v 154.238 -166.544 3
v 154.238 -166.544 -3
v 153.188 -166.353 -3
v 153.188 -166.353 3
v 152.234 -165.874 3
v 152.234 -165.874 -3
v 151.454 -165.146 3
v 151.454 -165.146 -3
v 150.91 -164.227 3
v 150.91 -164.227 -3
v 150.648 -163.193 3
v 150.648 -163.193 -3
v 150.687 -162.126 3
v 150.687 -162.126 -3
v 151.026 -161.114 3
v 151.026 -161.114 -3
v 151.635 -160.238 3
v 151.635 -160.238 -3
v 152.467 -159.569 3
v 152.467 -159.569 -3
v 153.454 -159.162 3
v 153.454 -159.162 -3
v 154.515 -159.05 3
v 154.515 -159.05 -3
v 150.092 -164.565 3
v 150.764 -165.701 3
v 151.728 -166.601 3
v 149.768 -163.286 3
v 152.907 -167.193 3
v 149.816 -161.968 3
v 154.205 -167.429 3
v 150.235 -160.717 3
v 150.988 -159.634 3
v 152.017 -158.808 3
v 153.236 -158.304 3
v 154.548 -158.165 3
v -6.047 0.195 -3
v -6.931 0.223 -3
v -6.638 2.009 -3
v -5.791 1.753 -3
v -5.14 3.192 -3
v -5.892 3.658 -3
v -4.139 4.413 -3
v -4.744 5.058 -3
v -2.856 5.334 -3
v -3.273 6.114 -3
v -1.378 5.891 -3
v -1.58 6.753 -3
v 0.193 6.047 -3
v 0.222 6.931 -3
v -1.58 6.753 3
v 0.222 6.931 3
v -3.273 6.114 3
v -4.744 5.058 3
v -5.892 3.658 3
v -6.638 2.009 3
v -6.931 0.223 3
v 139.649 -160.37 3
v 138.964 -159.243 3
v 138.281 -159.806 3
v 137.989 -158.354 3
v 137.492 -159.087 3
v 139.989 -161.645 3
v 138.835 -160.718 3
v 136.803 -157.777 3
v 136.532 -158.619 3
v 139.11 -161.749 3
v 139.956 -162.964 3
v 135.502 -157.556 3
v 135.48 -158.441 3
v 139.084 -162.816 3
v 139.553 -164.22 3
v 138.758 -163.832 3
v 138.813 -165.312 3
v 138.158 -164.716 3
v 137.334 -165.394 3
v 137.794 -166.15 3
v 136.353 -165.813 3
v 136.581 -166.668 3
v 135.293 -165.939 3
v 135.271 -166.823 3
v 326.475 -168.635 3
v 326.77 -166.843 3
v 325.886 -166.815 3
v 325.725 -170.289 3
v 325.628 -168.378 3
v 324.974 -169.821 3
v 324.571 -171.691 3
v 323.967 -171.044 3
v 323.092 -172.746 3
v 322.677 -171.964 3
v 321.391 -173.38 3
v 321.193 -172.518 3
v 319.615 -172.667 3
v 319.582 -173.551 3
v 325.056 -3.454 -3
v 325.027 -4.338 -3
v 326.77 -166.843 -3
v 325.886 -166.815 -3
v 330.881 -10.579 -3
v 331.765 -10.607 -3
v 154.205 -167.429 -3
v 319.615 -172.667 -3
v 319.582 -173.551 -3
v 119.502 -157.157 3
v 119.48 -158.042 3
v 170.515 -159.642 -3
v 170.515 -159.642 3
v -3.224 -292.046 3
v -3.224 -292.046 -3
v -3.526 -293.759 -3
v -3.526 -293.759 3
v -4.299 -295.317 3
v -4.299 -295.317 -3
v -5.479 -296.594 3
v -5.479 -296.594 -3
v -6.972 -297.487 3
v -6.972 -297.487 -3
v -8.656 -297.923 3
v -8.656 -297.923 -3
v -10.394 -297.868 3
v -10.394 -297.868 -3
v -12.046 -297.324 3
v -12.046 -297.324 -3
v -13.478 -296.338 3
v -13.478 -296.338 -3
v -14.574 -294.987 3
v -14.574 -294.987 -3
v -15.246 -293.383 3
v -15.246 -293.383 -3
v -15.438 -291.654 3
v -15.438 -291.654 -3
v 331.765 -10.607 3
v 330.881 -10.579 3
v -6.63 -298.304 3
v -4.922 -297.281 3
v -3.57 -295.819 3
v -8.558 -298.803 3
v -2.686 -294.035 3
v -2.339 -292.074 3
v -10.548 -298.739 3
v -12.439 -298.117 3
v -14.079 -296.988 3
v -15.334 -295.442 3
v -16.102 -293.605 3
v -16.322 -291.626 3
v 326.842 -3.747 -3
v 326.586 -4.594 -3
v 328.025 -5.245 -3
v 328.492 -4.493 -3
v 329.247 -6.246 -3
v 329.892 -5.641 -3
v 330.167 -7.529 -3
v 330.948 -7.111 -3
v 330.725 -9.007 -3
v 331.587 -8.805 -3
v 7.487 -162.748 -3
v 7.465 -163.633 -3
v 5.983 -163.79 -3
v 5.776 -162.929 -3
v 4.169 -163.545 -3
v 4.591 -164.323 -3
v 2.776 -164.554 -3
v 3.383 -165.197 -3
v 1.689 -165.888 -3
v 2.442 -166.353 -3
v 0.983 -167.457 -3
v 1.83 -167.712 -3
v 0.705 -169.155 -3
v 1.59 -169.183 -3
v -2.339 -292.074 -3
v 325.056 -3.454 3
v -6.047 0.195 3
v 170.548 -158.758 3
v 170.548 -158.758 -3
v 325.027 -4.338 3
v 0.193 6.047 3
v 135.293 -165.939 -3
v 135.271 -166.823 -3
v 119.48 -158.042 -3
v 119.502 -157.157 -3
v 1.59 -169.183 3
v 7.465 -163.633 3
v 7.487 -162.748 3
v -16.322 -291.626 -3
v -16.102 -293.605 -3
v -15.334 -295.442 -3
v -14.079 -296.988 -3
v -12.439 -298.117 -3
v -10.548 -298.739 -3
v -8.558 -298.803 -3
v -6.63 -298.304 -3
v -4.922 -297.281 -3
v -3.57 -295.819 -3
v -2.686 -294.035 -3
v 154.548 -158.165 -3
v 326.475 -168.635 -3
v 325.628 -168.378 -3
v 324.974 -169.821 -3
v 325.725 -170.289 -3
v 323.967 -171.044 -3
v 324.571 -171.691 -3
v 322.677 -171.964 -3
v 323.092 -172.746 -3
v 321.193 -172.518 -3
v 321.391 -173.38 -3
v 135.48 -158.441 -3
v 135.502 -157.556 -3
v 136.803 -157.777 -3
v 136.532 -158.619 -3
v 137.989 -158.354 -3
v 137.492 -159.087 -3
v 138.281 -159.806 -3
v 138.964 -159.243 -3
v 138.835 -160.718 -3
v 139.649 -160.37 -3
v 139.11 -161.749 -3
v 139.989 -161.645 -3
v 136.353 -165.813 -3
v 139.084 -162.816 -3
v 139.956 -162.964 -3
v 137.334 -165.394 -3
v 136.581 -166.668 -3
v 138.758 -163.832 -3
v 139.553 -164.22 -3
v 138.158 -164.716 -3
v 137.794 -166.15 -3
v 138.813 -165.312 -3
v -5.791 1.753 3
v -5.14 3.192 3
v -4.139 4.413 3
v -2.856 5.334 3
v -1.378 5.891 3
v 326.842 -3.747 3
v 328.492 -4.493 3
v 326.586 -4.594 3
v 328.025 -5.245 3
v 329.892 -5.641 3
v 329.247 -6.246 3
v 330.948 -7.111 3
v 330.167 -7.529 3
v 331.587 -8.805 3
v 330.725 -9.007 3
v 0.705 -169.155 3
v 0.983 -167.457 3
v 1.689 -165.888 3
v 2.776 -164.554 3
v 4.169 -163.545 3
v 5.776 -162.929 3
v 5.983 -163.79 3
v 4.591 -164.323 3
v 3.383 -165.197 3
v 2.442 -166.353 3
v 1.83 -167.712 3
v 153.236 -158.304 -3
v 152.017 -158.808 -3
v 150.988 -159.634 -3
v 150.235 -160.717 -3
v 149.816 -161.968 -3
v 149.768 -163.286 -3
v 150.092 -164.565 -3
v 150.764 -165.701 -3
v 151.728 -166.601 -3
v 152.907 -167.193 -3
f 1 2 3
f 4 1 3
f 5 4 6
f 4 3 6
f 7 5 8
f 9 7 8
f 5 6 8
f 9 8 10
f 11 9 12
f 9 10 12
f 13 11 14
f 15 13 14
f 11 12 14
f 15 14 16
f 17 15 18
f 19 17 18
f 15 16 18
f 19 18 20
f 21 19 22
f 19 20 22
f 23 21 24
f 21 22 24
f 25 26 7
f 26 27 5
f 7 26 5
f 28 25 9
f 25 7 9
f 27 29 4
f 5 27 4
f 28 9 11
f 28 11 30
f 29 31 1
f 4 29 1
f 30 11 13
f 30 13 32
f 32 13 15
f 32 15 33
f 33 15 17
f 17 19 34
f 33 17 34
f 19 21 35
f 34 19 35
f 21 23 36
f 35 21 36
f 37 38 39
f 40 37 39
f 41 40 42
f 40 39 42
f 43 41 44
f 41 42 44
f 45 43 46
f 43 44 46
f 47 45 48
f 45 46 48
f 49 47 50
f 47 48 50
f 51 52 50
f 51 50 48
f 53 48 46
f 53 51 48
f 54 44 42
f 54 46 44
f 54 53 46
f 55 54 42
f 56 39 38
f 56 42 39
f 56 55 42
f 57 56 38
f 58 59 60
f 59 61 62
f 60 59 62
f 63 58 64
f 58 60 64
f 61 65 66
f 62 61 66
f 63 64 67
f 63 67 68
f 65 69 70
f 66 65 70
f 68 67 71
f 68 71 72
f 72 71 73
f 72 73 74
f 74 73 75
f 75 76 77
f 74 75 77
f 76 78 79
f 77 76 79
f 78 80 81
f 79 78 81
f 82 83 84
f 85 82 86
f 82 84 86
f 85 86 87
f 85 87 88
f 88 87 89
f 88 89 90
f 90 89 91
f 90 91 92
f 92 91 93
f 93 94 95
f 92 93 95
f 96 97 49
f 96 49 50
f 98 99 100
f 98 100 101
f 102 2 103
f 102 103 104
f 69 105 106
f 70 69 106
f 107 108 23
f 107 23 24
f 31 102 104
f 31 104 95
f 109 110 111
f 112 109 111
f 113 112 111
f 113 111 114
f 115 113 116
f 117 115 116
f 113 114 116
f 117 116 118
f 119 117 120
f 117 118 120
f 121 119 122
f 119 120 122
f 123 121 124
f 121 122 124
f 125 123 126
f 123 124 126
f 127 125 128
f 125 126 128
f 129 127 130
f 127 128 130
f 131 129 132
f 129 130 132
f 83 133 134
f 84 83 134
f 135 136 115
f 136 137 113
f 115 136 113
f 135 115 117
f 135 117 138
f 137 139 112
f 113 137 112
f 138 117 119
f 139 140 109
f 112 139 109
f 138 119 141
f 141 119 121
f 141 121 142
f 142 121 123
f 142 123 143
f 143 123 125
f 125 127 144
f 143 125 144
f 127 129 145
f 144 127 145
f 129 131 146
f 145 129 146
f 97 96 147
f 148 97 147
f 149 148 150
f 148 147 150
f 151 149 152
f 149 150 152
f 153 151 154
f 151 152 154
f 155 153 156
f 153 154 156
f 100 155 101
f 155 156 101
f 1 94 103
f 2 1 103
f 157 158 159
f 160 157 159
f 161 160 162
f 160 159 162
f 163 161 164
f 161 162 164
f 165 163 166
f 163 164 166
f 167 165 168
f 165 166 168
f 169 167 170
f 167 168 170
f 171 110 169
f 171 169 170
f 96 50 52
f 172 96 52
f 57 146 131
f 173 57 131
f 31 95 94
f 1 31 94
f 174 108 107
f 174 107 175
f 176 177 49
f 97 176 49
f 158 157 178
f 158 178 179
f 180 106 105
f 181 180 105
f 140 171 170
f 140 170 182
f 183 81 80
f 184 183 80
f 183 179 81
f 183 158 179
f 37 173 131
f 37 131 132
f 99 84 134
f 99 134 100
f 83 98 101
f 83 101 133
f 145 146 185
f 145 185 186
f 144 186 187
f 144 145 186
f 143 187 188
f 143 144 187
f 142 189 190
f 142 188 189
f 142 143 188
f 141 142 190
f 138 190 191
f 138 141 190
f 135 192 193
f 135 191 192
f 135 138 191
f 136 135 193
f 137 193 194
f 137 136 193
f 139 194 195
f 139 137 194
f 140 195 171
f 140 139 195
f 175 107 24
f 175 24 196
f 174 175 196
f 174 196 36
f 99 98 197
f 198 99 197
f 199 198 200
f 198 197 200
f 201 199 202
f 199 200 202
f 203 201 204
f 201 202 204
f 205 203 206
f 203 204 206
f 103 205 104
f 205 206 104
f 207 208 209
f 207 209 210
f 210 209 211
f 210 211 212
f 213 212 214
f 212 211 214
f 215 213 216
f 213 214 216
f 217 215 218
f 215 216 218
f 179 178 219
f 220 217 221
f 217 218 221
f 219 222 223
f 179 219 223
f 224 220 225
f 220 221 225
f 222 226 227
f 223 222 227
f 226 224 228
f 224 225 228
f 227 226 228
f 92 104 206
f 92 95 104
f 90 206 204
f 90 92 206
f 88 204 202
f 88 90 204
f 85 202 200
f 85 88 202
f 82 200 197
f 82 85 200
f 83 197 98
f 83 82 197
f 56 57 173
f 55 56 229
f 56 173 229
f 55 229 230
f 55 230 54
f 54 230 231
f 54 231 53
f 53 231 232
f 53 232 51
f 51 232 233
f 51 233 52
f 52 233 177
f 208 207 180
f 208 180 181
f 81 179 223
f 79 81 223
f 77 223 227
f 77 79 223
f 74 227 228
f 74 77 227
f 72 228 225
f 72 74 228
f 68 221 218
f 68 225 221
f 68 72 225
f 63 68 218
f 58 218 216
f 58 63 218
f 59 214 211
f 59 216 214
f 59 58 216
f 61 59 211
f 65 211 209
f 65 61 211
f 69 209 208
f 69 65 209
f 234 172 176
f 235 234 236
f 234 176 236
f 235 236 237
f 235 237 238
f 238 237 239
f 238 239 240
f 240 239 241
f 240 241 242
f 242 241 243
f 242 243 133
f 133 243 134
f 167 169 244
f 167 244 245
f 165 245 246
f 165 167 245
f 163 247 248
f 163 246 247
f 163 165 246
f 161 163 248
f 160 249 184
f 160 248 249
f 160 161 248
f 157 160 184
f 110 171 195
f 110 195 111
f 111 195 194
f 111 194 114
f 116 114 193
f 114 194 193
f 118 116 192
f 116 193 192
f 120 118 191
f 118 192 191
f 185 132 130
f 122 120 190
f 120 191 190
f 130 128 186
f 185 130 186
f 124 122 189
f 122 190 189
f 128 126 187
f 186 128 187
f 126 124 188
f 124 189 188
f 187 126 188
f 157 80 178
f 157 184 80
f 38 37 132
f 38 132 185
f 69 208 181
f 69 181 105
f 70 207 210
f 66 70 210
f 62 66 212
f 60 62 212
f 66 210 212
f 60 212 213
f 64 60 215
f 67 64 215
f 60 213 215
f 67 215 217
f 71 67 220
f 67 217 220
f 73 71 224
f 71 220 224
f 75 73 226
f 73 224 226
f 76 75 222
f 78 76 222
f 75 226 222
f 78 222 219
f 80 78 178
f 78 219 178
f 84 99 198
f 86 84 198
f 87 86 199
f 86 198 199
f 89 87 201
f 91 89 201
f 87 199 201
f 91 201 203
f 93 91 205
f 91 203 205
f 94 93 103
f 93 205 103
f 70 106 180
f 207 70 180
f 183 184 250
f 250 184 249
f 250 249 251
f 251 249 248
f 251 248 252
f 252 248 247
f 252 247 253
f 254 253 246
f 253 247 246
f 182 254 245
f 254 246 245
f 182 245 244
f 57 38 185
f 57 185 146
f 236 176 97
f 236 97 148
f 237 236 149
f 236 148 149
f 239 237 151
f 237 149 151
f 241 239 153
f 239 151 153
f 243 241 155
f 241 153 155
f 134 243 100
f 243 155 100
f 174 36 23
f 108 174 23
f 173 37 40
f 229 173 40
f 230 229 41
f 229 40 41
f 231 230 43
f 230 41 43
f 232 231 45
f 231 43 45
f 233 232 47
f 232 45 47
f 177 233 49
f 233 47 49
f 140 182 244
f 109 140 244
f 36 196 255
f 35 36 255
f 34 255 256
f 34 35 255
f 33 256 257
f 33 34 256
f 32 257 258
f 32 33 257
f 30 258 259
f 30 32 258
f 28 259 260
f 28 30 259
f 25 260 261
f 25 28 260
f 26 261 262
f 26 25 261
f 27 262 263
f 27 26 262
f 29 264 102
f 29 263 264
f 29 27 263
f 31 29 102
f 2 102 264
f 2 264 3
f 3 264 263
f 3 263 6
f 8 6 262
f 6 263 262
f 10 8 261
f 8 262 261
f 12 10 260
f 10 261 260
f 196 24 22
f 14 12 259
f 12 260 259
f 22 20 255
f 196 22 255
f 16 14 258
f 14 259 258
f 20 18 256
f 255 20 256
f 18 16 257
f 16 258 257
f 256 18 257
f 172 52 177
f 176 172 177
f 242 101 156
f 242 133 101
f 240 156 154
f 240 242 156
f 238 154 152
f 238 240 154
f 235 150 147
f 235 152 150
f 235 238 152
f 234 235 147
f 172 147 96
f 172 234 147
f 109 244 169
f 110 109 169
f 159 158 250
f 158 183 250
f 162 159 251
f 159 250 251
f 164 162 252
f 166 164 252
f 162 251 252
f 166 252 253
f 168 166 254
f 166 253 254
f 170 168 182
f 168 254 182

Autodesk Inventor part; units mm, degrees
ref_plane "YZ Plane" through (0, 0, 0) normal (1, 0, 0) x (0, 1, 0)
ref_plane "XZ Plane" through (0, 0, 0) normal (0, 1, 0) x (-1, 0, 0)
sketch "Sketch1" plane through (0, 0, 0) normal (0, 0, 1) x (1, 0, 0)
  circle A0 centre (0, 0) radius 6.05
surface extrude "ExtrusionSrf1" sketch "Sketch1" along normal mid plane 6 shown yes curves A0
sketch "Sketch2" plane through (0, 0, 0) normal (0, 0, 1) x (1, 0, 0)
  circle A0 centre (324.834, -10.3853) radius 6.05
  point P0 (0, 0)
surface extrude "ExtrusionSrf2" sketch "Sketch2" along normal mid plane 6 shown yes curves A0
sketch "Sketch3" plane through (0, 0, 0) normal (0, 0, 1) x (1, 0, 0)
  circle A0 centre (-9.3308, -291.8509) radius 6.11
  point P0 (0, 0)
surface extrude "ExtrusionSrf3" sketch "Sketch3" along normal blind 6 shown yes curves A0
sketch "Sketch4" plane through (0, 0, 0) normal (0, 0, 1) x (1, 0, 0)
  circle A0 centre (7.3217, -169.3662) radius 5.735
  point P0 (0, 0)
surface extrude "ExtrusionSrf4" sketch "Sketch4" along normal mid plane 6 shown yes curves A0
sketch "Sketch5" plane through (0, 0, 0) normal (0, 0, 1) x (1, 0, 0)
  circle A0 centre (319.839, -166.6212) radius 6.05
  point P0 (0, 0)
surface extrude "ExtrusionSrf5" sketch "Sketch5" along normal mid plane 6 shown yes curves A0
sketch "Sketch6" plane through (0, 0, 0) normal (0, 0, 1) x (1, 0, 0)
  circle A0 centre (135.3864, -162.1898) radius 3
  point P0 (0, 0)
surface extrude "ExtrusionSrf6" sketch "Sketch6" along normal mid plane 6 shown yes curves A0
sketch "Sketch7" plane through (0, 0, 0) normal (0, 0, 1) x (1, 0, 0)
  circle A0 centre (154.3767, -162.797) radius 3
  point P0 (0, 0)
surface extrude "ExtrusionSrf7" sketch "Sketch7" along normal mid plane 6 shown yes curves A0
sketch "Sketch8" plane through (0, 0, 0) normal (0, 0, 1) x (1, 0, 0)
  circle A0 centre (0, 0) radius 6.05 projected
  circle A1 centre (7.3217, -169.3662) radius 5.735 projected
  circle A2 centre (-9.3308, -291.8509) radius 6.11 projected
  circle A3 centre (135.3864, -162.1898) radius 3 projected
  circle A4 centre (154.3767, -162.797) radius 3 projected
  circle A5 centre (319.839, -166.6212) radius 6.05 projected
  circle A6 centre (324.834, -10.3853) radius 6.05 projected
  arc A7 (0.2015, 6.3018) -> (-6.3017, 0.2028) centre (0, 0) ccw
  arc A8 (-15.6925, -291.6462) -> (-2.969, -292.0543) centre (-9.3308, -291.8509) ccw
  arc A9 (7.4805, -163.0032) -> (0.9599, -169.1628) centre (7.3217, -169.3662) ccw
  arc A10 (135.2865, -166.1936) -> (135.4863, -158.1861) centre (135.3864, -162.1898) ccw
  arc A11 (331.1358, -10.5868) -> (325.0355, -4.0835) centre (324.834, -10.3853) ccw
  arc A12 (154.5249, -158.7947) -> (154.2285, -166.7992) centre (154.3767, -162.797) ccw
  arc A13 (319.6057, -172.9219) -> (326.1408, -166.8227) centre (319.839, -166.6212) ccw
  line L0 (-15.6925, -291.6462) -> (-6.3017, 0.2028)
  line L1 (0.2015, 6.3018) -> (325.0355, -4.0835)
  line L2 (-2.969, -292.0543) -> (0.9599, -169.1628)
  line L3 (7.4805, -163.0032) -> (135.2865, -166.1936)
  line L4 (331.1358, -10.5868) -> (326.1408, -166.8227)
  line L5 (119.4863, -157.7867) -> (135.4863, -158.1861)
  line L6 (154.2285, -166.7992) -> (319.6057, -172.9219)
  line L7 (154.5249, -158.7947) -> (170.5249, -159.3871)
  dimension "d14" = 0.255
  dimension "d15" = 0.255
  dimension "d16" = 0.255
  dimension "d17" = 0.63
  dimension "d19" = 0.255
  dimension "d22" = 1.005
  dimension "d23" = 1.005
  dimension "d34" = 16
  dimension "d35" = 16
ref_plane "Work Plane2" through (170.5249, -159.3871, 0) normal (0.9993154, -0.0369972, 0) x (0.0369972, 0.9993154, 0)
sketch "Sketch10" plane through (170.5249, -159.3871, 0) normal (0.9993154, -0.0369972, 0) x (0.0369972, 0.9993154, 0)
  line L0 (0.63, 3) -> (-0.255, 3)
  line L1 (-0.255, 3) -> (-0.255, -3)
  line L2 (-0.255, -3) -> (0.63, -3)
  line L3 (0.63, -3) -> (0.63, 3)
  line L4 (0.63, 0) -> (-0.255, 0) construction
  point P0 (152.969, 0)
  point P1 (0, 0)
  dimension "d29" = 6
  dimension "d30" = 0.63
  dimension "d31" = 0.255
sweep "Sweep2" add profiles "Sketch10" path "Sketch8" path curves L7 A12 L6 A13 L4 A11 L1 A7 L0 A8 L2 A9 L3 A10 L5
equation "\"d14\" = inside"
equation "\"d15\" = inside"
equation "\"d16\" = inside"
equation "\"d17\" = backside"
equation "\"d19\" = inside"
equation "\"d30\" = backside"
equation "\"d31\" = inside"
equation "\"inside\" = 0.255"
equation "\"backside\" = 0.63"
properties part number "Belt 1" material "Rubber"
